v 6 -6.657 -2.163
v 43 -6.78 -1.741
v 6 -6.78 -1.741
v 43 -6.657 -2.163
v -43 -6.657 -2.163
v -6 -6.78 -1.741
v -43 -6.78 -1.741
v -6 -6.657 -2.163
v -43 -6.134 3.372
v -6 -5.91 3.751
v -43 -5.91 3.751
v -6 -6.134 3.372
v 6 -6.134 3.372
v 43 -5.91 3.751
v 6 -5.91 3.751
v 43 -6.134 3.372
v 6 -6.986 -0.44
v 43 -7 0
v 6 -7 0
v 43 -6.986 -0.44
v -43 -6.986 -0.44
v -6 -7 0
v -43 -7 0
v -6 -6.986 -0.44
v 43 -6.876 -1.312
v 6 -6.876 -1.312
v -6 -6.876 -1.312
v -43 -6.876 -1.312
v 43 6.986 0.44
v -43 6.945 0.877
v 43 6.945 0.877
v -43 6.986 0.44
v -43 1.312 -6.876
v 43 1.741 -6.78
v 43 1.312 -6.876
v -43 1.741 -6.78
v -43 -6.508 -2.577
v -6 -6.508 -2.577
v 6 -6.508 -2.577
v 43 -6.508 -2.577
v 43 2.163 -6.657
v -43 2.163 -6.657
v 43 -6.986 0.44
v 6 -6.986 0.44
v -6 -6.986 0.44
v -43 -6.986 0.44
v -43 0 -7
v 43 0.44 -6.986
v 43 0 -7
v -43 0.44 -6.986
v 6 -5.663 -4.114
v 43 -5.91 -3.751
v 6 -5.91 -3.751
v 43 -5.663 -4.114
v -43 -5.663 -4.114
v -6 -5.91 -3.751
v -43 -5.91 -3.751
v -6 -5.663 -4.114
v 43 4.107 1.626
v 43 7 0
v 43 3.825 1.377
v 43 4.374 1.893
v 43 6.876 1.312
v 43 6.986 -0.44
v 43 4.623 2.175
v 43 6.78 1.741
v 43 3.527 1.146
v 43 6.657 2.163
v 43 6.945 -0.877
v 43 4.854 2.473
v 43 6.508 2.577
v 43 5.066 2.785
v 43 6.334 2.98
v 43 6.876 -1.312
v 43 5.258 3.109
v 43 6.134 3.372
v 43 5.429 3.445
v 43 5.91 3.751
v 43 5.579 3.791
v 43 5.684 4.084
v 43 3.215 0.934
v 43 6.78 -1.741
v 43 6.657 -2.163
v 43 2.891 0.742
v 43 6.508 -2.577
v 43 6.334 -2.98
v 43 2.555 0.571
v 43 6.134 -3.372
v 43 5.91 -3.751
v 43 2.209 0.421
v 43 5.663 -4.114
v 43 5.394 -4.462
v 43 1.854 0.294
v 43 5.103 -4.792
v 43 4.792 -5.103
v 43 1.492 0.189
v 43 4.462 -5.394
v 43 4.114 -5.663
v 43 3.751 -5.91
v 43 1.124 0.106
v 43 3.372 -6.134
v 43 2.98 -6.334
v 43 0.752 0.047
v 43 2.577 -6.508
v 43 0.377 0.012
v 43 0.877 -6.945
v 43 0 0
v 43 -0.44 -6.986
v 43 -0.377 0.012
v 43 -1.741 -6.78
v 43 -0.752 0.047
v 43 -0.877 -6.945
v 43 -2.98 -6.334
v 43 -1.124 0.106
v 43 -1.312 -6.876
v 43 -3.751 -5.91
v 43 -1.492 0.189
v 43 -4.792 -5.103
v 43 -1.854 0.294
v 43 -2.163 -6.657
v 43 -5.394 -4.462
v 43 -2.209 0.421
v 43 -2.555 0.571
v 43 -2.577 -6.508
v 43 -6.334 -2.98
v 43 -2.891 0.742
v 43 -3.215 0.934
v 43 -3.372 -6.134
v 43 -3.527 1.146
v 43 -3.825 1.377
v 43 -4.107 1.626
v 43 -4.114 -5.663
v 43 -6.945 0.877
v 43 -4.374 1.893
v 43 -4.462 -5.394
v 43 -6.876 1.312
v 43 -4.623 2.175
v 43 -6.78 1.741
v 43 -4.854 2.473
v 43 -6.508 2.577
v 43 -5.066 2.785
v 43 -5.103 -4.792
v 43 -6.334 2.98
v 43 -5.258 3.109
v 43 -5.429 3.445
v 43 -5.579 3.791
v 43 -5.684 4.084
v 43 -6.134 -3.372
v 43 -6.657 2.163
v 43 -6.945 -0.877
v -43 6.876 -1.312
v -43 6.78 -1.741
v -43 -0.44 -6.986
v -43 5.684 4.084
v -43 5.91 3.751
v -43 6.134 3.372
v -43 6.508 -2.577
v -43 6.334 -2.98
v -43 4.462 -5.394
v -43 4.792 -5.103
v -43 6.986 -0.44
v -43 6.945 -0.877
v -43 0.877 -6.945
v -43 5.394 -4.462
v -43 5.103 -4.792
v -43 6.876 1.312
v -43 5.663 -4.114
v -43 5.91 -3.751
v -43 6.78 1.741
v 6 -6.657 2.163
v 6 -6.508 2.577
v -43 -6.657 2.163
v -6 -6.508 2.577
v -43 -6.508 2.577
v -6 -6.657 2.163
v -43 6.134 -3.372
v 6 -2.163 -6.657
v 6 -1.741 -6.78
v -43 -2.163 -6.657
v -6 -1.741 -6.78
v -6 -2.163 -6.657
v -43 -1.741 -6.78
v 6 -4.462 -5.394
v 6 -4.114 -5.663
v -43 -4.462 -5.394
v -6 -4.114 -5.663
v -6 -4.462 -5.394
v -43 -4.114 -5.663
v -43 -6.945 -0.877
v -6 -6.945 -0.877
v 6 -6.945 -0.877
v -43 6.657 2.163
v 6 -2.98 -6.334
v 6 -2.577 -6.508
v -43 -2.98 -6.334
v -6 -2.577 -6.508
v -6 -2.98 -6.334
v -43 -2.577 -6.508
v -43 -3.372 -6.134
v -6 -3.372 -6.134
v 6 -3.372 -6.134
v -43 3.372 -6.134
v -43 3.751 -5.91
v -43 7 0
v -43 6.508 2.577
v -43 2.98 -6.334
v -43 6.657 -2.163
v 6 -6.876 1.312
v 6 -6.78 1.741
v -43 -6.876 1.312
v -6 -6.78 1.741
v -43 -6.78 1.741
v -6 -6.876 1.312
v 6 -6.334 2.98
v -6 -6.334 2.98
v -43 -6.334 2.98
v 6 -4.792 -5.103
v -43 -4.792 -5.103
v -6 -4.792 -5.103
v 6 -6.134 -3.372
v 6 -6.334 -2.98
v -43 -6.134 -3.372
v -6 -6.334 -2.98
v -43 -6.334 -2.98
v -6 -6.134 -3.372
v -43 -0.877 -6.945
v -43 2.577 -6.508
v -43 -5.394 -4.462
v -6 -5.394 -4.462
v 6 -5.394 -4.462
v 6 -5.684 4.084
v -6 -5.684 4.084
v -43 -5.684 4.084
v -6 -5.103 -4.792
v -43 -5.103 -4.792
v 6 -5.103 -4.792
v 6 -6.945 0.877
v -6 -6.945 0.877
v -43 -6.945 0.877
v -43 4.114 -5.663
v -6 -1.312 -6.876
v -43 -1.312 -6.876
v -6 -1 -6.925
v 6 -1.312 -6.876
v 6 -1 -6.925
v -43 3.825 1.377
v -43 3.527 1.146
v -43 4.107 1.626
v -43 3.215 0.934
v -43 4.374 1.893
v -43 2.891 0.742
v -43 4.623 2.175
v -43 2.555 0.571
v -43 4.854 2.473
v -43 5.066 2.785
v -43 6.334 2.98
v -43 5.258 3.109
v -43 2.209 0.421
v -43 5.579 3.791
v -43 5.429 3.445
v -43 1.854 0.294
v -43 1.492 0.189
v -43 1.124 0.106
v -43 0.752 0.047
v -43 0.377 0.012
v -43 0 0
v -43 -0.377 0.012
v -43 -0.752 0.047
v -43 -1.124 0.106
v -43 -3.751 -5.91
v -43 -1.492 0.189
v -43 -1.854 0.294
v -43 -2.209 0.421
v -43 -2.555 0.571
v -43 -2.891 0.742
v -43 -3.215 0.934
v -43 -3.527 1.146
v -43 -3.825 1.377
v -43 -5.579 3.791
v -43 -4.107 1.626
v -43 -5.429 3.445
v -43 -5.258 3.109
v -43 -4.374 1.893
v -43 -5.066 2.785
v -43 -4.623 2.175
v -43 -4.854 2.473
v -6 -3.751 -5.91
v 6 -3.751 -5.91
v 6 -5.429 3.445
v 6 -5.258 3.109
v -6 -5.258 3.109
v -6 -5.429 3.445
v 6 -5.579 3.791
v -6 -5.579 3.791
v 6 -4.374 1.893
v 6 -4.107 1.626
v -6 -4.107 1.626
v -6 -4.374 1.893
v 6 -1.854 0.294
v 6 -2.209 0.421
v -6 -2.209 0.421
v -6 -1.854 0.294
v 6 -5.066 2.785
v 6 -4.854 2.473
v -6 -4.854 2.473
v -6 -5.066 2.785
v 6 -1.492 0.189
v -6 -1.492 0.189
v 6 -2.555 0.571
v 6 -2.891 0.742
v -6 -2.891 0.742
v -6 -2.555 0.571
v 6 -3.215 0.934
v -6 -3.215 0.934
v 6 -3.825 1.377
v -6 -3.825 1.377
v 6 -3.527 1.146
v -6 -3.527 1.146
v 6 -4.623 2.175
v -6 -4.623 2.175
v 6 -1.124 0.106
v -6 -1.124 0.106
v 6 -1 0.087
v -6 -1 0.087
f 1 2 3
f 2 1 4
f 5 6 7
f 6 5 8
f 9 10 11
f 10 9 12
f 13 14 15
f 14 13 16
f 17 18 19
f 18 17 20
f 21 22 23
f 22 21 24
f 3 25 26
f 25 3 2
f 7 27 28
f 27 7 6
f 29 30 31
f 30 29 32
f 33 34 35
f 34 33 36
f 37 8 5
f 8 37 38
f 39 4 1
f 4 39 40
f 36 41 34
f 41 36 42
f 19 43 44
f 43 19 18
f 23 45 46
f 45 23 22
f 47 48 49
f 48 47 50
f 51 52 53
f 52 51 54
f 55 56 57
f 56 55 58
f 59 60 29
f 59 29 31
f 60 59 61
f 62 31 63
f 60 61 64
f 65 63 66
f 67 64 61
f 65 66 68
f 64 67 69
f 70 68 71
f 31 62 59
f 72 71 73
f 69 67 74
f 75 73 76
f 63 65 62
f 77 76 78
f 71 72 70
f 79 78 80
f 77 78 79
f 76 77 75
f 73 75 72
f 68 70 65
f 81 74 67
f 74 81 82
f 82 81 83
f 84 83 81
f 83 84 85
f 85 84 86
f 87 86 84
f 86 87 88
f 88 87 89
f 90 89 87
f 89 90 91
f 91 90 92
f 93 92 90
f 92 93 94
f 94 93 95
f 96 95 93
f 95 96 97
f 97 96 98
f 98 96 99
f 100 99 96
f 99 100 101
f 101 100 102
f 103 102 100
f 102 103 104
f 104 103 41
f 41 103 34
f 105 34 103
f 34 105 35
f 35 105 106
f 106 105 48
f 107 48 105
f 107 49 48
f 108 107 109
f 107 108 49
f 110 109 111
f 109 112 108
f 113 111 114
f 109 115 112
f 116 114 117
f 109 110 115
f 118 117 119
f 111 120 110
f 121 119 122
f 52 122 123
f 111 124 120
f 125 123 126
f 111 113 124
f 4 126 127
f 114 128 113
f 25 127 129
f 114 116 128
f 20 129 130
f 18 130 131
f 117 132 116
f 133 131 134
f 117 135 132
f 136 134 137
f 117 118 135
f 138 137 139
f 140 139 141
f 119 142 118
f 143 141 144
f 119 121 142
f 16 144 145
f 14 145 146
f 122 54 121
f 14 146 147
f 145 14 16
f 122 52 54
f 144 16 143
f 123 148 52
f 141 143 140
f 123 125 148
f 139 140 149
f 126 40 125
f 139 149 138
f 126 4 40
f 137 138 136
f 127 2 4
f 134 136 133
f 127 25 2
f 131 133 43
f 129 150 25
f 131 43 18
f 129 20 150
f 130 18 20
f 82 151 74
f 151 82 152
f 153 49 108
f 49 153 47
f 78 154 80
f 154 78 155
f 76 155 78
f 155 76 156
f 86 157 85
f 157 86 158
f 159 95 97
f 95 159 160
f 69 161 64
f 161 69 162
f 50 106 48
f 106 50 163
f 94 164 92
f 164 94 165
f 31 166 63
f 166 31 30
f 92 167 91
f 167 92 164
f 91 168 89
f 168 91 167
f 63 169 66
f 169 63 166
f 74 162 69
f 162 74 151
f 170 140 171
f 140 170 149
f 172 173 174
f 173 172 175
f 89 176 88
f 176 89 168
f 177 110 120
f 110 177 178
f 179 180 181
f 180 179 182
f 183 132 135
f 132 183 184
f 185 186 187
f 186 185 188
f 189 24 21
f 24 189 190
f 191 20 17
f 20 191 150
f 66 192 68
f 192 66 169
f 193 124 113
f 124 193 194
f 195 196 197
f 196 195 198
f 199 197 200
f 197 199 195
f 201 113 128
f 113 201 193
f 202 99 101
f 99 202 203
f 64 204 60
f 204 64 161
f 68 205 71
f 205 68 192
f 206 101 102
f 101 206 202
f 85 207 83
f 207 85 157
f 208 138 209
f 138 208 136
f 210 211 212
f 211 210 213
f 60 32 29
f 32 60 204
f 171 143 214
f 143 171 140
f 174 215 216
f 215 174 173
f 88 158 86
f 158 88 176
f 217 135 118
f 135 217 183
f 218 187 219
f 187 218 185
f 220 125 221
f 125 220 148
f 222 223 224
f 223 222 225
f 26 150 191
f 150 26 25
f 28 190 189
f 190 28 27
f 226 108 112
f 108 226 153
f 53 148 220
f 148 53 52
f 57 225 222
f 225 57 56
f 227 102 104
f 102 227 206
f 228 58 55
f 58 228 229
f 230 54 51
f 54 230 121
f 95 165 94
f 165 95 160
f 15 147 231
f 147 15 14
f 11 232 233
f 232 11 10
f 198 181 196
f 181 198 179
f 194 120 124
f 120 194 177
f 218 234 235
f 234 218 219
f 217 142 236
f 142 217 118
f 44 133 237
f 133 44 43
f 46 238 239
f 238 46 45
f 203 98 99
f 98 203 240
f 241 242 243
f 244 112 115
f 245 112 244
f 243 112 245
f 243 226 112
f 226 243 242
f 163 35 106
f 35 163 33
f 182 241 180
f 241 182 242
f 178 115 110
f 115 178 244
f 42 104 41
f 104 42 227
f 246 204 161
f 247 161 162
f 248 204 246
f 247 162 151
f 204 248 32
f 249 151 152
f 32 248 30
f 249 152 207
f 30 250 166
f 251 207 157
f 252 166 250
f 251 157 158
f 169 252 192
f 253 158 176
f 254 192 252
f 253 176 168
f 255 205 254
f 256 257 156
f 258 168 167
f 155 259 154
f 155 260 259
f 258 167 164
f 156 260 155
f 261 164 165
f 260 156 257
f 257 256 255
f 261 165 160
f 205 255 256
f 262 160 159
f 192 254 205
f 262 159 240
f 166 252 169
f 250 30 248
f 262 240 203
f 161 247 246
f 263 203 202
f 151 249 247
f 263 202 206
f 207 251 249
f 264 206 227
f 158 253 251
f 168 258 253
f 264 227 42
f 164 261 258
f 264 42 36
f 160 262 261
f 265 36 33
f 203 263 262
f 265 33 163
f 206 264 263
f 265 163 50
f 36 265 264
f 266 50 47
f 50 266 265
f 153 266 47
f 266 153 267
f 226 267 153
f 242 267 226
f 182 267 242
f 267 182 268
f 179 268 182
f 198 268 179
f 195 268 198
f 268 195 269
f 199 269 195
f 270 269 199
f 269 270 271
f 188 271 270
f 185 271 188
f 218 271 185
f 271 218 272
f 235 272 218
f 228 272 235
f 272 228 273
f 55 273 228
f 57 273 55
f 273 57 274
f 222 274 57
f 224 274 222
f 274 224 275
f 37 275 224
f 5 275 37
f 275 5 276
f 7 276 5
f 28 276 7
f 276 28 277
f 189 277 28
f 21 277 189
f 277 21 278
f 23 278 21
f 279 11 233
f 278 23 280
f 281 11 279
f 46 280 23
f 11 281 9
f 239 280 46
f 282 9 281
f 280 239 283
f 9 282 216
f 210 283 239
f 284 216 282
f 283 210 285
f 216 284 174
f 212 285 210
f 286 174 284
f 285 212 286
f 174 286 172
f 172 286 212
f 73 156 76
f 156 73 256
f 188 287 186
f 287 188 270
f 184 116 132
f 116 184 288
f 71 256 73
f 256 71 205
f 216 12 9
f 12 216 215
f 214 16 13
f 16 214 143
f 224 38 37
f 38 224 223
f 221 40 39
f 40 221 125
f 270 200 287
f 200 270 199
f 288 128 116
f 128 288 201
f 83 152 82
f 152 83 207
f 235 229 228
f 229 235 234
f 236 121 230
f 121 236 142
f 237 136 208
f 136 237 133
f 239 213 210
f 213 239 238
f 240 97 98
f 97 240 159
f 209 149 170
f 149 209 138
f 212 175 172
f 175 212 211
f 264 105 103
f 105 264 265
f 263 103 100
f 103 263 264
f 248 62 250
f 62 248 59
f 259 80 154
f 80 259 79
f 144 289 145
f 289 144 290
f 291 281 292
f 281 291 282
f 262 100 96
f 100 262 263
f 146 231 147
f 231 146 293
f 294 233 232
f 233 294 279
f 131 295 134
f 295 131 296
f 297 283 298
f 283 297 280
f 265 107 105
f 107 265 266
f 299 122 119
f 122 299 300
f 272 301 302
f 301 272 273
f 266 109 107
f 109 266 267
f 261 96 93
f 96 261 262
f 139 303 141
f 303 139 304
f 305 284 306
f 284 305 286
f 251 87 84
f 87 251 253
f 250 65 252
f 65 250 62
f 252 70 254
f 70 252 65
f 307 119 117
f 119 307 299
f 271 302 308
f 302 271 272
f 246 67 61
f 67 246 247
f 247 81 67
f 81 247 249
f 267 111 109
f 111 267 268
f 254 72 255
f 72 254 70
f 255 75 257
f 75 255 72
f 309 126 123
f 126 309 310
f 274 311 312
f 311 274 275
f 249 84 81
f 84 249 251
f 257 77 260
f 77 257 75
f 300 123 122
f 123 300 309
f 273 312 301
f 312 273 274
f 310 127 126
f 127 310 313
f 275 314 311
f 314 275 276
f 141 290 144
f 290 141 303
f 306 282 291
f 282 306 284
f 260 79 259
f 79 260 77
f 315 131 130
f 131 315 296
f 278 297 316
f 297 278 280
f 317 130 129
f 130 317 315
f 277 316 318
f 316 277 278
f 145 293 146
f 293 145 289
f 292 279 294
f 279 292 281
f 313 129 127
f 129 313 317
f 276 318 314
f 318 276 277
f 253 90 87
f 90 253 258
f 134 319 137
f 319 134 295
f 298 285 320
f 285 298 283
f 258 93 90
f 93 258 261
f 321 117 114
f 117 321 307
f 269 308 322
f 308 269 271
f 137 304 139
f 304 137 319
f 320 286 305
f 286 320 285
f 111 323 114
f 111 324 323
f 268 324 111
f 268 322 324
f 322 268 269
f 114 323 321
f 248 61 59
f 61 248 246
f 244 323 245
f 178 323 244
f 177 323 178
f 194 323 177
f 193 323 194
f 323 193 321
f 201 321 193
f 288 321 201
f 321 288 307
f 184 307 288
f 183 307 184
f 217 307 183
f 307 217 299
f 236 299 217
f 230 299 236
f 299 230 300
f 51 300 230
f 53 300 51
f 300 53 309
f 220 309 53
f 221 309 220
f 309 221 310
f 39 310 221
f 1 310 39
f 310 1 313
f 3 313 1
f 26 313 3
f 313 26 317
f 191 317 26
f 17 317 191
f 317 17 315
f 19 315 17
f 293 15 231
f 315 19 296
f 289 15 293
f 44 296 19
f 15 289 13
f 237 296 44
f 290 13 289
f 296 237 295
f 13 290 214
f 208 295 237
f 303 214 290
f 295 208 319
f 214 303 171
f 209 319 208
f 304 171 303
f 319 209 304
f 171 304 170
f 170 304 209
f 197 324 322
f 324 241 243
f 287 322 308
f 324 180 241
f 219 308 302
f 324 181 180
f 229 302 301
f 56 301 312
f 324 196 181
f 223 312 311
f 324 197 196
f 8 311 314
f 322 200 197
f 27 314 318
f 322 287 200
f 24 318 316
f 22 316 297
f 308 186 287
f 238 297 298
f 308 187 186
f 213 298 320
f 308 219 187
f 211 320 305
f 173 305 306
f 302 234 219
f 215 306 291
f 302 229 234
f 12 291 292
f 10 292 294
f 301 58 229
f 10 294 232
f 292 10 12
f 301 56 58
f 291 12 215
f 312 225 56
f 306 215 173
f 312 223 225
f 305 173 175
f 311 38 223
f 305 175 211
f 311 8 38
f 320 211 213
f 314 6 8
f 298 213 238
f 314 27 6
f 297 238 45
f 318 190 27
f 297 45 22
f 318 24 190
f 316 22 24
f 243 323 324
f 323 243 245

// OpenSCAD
$fn=100;

difference()
{
 
difference()
{
rotate([0,90,0]) cylinder(86,7,7, center = true);
rotate([0,90,0]) translate([-6,0,-1])  cylinder(88,6,6,center=true);

}
  translate([0,-4,0]) cube([12,6,20], center=true); 

}
